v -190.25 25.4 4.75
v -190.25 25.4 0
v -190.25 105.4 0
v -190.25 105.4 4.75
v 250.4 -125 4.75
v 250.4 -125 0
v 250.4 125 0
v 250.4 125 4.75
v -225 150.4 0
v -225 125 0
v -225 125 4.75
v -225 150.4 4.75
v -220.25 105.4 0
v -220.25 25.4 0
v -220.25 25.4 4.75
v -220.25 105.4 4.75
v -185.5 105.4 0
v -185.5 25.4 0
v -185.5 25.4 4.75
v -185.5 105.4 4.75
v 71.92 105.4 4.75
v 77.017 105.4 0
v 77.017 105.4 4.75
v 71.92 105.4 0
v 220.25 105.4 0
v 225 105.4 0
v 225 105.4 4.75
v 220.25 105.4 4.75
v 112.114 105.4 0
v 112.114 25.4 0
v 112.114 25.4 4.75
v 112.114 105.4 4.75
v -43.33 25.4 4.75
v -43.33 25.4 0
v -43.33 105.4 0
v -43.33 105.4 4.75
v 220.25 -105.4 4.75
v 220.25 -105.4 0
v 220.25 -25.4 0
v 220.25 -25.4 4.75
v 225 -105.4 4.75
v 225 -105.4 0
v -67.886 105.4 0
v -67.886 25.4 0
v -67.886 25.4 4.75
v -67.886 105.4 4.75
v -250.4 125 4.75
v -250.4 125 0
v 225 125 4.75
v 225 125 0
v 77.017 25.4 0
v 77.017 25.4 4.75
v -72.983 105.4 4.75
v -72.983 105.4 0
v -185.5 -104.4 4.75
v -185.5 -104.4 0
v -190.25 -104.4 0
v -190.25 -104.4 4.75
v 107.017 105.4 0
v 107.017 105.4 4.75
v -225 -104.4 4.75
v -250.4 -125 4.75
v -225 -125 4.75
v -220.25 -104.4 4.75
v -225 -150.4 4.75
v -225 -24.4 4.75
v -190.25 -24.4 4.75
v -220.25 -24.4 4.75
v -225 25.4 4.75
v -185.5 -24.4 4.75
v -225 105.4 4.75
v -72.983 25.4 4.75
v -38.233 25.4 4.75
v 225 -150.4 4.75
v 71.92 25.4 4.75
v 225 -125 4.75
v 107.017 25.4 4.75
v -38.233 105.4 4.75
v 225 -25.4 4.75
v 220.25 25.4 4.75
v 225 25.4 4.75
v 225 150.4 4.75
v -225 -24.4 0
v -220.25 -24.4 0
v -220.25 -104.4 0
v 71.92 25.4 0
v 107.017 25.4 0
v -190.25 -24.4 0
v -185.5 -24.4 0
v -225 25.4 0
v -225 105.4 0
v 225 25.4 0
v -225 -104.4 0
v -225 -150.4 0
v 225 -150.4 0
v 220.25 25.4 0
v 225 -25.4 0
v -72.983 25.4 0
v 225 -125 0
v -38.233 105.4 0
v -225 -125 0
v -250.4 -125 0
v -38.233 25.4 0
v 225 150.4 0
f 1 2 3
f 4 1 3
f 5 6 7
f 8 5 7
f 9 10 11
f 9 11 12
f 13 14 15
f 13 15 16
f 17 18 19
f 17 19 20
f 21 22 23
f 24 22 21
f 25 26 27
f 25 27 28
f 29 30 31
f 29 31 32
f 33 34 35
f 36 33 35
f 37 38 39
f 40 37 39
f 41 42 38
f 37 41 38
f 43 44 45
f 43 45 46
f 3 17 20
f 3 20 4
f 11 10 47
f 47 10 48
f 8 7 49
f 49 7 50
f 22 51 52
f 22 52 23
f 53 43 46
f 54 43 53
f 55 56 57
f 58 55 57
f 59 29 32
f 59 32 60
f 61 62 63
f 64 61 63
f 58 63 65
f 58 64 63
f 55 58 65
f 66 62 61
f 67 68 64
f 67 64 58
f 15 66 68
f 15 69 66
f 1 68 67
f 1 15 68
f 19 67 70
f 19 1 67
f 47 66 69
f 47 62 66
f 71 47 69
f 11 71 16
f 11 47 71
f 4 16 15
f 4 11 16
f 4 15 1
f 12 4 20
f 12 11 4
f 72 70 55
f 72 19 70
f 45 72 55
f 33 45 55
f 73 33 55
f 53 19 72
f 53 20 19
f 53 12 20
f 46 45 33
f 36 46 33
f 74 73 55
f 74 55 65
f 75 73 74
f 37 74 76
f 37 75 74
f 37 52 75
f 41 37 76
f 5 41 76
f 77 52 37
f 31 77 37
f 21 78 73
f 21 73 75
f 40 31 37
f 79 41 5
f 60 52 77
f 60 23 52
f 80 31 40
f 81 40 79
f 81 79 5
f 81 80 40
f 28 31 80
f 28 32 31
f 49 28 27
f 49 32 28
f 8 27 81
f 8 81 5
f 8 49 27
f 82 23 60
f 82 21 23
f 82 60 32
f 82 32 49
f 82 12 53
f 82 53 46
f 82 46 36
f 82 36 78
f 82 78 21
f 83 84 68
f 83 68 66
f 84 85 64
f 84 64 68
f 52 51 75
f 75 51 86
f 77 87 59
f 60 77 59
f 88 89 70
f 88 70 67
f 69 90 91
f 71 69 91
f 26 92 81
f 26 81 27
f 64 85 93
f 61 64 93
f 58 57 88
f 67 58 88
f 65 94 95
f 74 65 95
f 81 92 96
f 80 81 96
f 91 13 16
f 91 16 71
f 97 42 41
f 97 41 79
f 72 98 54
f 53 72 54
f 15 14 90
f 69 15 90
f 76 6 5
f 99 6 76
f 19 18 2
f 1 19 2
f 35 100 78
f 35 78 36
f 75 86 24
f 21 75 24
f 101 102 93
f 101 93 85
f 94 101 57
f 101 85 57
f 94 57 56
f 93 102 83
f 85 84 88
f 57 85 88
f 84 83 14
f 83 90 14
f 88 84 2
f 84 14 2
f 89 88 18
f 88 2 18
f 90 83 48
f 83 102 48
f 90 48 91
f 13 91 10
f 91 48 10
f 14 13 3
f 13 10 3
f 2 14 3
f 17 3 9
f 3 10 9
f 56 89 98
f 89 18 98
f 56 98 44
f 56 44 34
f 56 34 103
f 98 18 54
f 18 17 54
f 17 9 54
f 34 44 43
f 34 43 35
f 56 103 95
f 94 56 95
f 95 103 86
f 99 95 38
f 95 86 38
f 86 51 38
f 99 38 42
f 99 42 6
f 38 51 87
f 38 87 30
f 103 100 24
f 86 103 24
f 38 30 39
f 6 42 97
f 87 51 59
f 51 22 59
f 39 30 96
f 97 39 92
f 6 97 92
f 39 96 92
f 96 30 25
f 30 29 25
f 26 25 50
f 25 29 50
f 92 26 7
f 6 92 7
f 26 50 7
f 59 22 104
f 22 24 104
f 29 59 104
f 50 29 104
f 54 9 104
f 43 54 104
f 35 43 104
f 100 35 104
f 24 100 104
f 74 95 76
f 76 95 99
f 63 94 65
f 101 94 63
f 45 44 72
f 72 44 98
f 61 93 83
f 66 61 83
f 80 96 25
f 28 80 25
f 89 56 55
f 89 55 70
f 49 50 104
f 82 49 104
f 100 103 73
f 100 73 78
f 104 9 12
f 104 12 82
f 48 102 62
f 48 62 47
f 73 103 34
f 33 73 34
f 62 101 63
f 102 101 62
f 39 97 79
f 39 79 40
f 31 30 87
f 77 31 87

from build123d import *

# Parameters (mm, degrees)
SKETCH_1_W          = 500.8
SKETCH_1_H          = 300.8
EXTRUDE_1_DEPTH     = 4.75
SKETCH_2_W          = 25.4
SKETCH_2_H          = 25.4
SKETCH_2_W_2        = 4.75
SKETCH_2_H_2        = 80
SKETCH_2_W_3        = 5.096596069
CUT_EXTRUDE_1_DEPTH = 10


with BuildPart() as part:
    # 草圖1 → 填料-伸長1 (new body)
    with BuildSketch(Plane.XY):
        Rectangle(SKETCH_1_W, SKETCH_1_H)
    extrude(amount=EXTRUDE_1_DEPTH)

    # 草圖2 → 除料-伸長1 (cut)
    with BuildSketch(Plane(origin=(0, 0, 0), x_dir=(-1, 0, 0), z_dir=(0, 0, -1))):
        with Locations((-237.7, 137.7)):
            Rectangle(SKETCH_2_W, SKETCH_2_H)
        with Locations((-237.7, -137.7)):
            Rectangle(SKETCH_2_W, SKETCH_2_H)
        with Locations((237.7, 137.7)):
            Rectangle(SKETCH_2_W, SKETCH_2_H)
        with Locations((237.7, -137.7)):
            Rectangle(SKETCH_2_W, SKETCH_2_H)
        with Locations((-222.625, 65.4)):
            Rectangle(SKETCH_2_W_2, SKETCH_2_H_2)
        with Locations((-222.625, -65.4)):
            Rectangle(SKETCH_2_W_2, SKETCH_2_H_2)
        with Locations((222.625, 65.4)):
            Rectangle(SKETCH_2_W_2, SKETCH_2_H_2)
        with Locations((222.625, -64.4)):
            Rectangle(SKETCH_2_W_2, SKETCH_2_H_2)
        with Locations((187.875, 65.4)):
            Rectangle(SKETCH_2_W_2, SKETCH_2_H_2)
        with Locations((187.875, -64.4)):
            Rectangle(SKETCH_2_W_2, SKETCH_2_H_2)
        with Locations((-109.565361966, 65.4)):
            Rectangle(SKETCH_2_W_3, SKETCH_2_H_2)
        with Locations((-74.468765897, 65.4)):
            Rectangle(SKETCH_2_W_3, SKETCH_2_H_2)
        with Locations((40.781234104, 65.4)):
            Rectangle(SKETCH_2_W_3, SKETCH_2_H_2)
        with Locations((70.434638035, 65.4)):
            Rectangle(SKETCH_2_W_3, SKETCH_2_H_2)
    extrude(amount=-CUT_EXTRUDE_1_DEPTH, mode=Mode.SUBTRACT)


solid = part.part
